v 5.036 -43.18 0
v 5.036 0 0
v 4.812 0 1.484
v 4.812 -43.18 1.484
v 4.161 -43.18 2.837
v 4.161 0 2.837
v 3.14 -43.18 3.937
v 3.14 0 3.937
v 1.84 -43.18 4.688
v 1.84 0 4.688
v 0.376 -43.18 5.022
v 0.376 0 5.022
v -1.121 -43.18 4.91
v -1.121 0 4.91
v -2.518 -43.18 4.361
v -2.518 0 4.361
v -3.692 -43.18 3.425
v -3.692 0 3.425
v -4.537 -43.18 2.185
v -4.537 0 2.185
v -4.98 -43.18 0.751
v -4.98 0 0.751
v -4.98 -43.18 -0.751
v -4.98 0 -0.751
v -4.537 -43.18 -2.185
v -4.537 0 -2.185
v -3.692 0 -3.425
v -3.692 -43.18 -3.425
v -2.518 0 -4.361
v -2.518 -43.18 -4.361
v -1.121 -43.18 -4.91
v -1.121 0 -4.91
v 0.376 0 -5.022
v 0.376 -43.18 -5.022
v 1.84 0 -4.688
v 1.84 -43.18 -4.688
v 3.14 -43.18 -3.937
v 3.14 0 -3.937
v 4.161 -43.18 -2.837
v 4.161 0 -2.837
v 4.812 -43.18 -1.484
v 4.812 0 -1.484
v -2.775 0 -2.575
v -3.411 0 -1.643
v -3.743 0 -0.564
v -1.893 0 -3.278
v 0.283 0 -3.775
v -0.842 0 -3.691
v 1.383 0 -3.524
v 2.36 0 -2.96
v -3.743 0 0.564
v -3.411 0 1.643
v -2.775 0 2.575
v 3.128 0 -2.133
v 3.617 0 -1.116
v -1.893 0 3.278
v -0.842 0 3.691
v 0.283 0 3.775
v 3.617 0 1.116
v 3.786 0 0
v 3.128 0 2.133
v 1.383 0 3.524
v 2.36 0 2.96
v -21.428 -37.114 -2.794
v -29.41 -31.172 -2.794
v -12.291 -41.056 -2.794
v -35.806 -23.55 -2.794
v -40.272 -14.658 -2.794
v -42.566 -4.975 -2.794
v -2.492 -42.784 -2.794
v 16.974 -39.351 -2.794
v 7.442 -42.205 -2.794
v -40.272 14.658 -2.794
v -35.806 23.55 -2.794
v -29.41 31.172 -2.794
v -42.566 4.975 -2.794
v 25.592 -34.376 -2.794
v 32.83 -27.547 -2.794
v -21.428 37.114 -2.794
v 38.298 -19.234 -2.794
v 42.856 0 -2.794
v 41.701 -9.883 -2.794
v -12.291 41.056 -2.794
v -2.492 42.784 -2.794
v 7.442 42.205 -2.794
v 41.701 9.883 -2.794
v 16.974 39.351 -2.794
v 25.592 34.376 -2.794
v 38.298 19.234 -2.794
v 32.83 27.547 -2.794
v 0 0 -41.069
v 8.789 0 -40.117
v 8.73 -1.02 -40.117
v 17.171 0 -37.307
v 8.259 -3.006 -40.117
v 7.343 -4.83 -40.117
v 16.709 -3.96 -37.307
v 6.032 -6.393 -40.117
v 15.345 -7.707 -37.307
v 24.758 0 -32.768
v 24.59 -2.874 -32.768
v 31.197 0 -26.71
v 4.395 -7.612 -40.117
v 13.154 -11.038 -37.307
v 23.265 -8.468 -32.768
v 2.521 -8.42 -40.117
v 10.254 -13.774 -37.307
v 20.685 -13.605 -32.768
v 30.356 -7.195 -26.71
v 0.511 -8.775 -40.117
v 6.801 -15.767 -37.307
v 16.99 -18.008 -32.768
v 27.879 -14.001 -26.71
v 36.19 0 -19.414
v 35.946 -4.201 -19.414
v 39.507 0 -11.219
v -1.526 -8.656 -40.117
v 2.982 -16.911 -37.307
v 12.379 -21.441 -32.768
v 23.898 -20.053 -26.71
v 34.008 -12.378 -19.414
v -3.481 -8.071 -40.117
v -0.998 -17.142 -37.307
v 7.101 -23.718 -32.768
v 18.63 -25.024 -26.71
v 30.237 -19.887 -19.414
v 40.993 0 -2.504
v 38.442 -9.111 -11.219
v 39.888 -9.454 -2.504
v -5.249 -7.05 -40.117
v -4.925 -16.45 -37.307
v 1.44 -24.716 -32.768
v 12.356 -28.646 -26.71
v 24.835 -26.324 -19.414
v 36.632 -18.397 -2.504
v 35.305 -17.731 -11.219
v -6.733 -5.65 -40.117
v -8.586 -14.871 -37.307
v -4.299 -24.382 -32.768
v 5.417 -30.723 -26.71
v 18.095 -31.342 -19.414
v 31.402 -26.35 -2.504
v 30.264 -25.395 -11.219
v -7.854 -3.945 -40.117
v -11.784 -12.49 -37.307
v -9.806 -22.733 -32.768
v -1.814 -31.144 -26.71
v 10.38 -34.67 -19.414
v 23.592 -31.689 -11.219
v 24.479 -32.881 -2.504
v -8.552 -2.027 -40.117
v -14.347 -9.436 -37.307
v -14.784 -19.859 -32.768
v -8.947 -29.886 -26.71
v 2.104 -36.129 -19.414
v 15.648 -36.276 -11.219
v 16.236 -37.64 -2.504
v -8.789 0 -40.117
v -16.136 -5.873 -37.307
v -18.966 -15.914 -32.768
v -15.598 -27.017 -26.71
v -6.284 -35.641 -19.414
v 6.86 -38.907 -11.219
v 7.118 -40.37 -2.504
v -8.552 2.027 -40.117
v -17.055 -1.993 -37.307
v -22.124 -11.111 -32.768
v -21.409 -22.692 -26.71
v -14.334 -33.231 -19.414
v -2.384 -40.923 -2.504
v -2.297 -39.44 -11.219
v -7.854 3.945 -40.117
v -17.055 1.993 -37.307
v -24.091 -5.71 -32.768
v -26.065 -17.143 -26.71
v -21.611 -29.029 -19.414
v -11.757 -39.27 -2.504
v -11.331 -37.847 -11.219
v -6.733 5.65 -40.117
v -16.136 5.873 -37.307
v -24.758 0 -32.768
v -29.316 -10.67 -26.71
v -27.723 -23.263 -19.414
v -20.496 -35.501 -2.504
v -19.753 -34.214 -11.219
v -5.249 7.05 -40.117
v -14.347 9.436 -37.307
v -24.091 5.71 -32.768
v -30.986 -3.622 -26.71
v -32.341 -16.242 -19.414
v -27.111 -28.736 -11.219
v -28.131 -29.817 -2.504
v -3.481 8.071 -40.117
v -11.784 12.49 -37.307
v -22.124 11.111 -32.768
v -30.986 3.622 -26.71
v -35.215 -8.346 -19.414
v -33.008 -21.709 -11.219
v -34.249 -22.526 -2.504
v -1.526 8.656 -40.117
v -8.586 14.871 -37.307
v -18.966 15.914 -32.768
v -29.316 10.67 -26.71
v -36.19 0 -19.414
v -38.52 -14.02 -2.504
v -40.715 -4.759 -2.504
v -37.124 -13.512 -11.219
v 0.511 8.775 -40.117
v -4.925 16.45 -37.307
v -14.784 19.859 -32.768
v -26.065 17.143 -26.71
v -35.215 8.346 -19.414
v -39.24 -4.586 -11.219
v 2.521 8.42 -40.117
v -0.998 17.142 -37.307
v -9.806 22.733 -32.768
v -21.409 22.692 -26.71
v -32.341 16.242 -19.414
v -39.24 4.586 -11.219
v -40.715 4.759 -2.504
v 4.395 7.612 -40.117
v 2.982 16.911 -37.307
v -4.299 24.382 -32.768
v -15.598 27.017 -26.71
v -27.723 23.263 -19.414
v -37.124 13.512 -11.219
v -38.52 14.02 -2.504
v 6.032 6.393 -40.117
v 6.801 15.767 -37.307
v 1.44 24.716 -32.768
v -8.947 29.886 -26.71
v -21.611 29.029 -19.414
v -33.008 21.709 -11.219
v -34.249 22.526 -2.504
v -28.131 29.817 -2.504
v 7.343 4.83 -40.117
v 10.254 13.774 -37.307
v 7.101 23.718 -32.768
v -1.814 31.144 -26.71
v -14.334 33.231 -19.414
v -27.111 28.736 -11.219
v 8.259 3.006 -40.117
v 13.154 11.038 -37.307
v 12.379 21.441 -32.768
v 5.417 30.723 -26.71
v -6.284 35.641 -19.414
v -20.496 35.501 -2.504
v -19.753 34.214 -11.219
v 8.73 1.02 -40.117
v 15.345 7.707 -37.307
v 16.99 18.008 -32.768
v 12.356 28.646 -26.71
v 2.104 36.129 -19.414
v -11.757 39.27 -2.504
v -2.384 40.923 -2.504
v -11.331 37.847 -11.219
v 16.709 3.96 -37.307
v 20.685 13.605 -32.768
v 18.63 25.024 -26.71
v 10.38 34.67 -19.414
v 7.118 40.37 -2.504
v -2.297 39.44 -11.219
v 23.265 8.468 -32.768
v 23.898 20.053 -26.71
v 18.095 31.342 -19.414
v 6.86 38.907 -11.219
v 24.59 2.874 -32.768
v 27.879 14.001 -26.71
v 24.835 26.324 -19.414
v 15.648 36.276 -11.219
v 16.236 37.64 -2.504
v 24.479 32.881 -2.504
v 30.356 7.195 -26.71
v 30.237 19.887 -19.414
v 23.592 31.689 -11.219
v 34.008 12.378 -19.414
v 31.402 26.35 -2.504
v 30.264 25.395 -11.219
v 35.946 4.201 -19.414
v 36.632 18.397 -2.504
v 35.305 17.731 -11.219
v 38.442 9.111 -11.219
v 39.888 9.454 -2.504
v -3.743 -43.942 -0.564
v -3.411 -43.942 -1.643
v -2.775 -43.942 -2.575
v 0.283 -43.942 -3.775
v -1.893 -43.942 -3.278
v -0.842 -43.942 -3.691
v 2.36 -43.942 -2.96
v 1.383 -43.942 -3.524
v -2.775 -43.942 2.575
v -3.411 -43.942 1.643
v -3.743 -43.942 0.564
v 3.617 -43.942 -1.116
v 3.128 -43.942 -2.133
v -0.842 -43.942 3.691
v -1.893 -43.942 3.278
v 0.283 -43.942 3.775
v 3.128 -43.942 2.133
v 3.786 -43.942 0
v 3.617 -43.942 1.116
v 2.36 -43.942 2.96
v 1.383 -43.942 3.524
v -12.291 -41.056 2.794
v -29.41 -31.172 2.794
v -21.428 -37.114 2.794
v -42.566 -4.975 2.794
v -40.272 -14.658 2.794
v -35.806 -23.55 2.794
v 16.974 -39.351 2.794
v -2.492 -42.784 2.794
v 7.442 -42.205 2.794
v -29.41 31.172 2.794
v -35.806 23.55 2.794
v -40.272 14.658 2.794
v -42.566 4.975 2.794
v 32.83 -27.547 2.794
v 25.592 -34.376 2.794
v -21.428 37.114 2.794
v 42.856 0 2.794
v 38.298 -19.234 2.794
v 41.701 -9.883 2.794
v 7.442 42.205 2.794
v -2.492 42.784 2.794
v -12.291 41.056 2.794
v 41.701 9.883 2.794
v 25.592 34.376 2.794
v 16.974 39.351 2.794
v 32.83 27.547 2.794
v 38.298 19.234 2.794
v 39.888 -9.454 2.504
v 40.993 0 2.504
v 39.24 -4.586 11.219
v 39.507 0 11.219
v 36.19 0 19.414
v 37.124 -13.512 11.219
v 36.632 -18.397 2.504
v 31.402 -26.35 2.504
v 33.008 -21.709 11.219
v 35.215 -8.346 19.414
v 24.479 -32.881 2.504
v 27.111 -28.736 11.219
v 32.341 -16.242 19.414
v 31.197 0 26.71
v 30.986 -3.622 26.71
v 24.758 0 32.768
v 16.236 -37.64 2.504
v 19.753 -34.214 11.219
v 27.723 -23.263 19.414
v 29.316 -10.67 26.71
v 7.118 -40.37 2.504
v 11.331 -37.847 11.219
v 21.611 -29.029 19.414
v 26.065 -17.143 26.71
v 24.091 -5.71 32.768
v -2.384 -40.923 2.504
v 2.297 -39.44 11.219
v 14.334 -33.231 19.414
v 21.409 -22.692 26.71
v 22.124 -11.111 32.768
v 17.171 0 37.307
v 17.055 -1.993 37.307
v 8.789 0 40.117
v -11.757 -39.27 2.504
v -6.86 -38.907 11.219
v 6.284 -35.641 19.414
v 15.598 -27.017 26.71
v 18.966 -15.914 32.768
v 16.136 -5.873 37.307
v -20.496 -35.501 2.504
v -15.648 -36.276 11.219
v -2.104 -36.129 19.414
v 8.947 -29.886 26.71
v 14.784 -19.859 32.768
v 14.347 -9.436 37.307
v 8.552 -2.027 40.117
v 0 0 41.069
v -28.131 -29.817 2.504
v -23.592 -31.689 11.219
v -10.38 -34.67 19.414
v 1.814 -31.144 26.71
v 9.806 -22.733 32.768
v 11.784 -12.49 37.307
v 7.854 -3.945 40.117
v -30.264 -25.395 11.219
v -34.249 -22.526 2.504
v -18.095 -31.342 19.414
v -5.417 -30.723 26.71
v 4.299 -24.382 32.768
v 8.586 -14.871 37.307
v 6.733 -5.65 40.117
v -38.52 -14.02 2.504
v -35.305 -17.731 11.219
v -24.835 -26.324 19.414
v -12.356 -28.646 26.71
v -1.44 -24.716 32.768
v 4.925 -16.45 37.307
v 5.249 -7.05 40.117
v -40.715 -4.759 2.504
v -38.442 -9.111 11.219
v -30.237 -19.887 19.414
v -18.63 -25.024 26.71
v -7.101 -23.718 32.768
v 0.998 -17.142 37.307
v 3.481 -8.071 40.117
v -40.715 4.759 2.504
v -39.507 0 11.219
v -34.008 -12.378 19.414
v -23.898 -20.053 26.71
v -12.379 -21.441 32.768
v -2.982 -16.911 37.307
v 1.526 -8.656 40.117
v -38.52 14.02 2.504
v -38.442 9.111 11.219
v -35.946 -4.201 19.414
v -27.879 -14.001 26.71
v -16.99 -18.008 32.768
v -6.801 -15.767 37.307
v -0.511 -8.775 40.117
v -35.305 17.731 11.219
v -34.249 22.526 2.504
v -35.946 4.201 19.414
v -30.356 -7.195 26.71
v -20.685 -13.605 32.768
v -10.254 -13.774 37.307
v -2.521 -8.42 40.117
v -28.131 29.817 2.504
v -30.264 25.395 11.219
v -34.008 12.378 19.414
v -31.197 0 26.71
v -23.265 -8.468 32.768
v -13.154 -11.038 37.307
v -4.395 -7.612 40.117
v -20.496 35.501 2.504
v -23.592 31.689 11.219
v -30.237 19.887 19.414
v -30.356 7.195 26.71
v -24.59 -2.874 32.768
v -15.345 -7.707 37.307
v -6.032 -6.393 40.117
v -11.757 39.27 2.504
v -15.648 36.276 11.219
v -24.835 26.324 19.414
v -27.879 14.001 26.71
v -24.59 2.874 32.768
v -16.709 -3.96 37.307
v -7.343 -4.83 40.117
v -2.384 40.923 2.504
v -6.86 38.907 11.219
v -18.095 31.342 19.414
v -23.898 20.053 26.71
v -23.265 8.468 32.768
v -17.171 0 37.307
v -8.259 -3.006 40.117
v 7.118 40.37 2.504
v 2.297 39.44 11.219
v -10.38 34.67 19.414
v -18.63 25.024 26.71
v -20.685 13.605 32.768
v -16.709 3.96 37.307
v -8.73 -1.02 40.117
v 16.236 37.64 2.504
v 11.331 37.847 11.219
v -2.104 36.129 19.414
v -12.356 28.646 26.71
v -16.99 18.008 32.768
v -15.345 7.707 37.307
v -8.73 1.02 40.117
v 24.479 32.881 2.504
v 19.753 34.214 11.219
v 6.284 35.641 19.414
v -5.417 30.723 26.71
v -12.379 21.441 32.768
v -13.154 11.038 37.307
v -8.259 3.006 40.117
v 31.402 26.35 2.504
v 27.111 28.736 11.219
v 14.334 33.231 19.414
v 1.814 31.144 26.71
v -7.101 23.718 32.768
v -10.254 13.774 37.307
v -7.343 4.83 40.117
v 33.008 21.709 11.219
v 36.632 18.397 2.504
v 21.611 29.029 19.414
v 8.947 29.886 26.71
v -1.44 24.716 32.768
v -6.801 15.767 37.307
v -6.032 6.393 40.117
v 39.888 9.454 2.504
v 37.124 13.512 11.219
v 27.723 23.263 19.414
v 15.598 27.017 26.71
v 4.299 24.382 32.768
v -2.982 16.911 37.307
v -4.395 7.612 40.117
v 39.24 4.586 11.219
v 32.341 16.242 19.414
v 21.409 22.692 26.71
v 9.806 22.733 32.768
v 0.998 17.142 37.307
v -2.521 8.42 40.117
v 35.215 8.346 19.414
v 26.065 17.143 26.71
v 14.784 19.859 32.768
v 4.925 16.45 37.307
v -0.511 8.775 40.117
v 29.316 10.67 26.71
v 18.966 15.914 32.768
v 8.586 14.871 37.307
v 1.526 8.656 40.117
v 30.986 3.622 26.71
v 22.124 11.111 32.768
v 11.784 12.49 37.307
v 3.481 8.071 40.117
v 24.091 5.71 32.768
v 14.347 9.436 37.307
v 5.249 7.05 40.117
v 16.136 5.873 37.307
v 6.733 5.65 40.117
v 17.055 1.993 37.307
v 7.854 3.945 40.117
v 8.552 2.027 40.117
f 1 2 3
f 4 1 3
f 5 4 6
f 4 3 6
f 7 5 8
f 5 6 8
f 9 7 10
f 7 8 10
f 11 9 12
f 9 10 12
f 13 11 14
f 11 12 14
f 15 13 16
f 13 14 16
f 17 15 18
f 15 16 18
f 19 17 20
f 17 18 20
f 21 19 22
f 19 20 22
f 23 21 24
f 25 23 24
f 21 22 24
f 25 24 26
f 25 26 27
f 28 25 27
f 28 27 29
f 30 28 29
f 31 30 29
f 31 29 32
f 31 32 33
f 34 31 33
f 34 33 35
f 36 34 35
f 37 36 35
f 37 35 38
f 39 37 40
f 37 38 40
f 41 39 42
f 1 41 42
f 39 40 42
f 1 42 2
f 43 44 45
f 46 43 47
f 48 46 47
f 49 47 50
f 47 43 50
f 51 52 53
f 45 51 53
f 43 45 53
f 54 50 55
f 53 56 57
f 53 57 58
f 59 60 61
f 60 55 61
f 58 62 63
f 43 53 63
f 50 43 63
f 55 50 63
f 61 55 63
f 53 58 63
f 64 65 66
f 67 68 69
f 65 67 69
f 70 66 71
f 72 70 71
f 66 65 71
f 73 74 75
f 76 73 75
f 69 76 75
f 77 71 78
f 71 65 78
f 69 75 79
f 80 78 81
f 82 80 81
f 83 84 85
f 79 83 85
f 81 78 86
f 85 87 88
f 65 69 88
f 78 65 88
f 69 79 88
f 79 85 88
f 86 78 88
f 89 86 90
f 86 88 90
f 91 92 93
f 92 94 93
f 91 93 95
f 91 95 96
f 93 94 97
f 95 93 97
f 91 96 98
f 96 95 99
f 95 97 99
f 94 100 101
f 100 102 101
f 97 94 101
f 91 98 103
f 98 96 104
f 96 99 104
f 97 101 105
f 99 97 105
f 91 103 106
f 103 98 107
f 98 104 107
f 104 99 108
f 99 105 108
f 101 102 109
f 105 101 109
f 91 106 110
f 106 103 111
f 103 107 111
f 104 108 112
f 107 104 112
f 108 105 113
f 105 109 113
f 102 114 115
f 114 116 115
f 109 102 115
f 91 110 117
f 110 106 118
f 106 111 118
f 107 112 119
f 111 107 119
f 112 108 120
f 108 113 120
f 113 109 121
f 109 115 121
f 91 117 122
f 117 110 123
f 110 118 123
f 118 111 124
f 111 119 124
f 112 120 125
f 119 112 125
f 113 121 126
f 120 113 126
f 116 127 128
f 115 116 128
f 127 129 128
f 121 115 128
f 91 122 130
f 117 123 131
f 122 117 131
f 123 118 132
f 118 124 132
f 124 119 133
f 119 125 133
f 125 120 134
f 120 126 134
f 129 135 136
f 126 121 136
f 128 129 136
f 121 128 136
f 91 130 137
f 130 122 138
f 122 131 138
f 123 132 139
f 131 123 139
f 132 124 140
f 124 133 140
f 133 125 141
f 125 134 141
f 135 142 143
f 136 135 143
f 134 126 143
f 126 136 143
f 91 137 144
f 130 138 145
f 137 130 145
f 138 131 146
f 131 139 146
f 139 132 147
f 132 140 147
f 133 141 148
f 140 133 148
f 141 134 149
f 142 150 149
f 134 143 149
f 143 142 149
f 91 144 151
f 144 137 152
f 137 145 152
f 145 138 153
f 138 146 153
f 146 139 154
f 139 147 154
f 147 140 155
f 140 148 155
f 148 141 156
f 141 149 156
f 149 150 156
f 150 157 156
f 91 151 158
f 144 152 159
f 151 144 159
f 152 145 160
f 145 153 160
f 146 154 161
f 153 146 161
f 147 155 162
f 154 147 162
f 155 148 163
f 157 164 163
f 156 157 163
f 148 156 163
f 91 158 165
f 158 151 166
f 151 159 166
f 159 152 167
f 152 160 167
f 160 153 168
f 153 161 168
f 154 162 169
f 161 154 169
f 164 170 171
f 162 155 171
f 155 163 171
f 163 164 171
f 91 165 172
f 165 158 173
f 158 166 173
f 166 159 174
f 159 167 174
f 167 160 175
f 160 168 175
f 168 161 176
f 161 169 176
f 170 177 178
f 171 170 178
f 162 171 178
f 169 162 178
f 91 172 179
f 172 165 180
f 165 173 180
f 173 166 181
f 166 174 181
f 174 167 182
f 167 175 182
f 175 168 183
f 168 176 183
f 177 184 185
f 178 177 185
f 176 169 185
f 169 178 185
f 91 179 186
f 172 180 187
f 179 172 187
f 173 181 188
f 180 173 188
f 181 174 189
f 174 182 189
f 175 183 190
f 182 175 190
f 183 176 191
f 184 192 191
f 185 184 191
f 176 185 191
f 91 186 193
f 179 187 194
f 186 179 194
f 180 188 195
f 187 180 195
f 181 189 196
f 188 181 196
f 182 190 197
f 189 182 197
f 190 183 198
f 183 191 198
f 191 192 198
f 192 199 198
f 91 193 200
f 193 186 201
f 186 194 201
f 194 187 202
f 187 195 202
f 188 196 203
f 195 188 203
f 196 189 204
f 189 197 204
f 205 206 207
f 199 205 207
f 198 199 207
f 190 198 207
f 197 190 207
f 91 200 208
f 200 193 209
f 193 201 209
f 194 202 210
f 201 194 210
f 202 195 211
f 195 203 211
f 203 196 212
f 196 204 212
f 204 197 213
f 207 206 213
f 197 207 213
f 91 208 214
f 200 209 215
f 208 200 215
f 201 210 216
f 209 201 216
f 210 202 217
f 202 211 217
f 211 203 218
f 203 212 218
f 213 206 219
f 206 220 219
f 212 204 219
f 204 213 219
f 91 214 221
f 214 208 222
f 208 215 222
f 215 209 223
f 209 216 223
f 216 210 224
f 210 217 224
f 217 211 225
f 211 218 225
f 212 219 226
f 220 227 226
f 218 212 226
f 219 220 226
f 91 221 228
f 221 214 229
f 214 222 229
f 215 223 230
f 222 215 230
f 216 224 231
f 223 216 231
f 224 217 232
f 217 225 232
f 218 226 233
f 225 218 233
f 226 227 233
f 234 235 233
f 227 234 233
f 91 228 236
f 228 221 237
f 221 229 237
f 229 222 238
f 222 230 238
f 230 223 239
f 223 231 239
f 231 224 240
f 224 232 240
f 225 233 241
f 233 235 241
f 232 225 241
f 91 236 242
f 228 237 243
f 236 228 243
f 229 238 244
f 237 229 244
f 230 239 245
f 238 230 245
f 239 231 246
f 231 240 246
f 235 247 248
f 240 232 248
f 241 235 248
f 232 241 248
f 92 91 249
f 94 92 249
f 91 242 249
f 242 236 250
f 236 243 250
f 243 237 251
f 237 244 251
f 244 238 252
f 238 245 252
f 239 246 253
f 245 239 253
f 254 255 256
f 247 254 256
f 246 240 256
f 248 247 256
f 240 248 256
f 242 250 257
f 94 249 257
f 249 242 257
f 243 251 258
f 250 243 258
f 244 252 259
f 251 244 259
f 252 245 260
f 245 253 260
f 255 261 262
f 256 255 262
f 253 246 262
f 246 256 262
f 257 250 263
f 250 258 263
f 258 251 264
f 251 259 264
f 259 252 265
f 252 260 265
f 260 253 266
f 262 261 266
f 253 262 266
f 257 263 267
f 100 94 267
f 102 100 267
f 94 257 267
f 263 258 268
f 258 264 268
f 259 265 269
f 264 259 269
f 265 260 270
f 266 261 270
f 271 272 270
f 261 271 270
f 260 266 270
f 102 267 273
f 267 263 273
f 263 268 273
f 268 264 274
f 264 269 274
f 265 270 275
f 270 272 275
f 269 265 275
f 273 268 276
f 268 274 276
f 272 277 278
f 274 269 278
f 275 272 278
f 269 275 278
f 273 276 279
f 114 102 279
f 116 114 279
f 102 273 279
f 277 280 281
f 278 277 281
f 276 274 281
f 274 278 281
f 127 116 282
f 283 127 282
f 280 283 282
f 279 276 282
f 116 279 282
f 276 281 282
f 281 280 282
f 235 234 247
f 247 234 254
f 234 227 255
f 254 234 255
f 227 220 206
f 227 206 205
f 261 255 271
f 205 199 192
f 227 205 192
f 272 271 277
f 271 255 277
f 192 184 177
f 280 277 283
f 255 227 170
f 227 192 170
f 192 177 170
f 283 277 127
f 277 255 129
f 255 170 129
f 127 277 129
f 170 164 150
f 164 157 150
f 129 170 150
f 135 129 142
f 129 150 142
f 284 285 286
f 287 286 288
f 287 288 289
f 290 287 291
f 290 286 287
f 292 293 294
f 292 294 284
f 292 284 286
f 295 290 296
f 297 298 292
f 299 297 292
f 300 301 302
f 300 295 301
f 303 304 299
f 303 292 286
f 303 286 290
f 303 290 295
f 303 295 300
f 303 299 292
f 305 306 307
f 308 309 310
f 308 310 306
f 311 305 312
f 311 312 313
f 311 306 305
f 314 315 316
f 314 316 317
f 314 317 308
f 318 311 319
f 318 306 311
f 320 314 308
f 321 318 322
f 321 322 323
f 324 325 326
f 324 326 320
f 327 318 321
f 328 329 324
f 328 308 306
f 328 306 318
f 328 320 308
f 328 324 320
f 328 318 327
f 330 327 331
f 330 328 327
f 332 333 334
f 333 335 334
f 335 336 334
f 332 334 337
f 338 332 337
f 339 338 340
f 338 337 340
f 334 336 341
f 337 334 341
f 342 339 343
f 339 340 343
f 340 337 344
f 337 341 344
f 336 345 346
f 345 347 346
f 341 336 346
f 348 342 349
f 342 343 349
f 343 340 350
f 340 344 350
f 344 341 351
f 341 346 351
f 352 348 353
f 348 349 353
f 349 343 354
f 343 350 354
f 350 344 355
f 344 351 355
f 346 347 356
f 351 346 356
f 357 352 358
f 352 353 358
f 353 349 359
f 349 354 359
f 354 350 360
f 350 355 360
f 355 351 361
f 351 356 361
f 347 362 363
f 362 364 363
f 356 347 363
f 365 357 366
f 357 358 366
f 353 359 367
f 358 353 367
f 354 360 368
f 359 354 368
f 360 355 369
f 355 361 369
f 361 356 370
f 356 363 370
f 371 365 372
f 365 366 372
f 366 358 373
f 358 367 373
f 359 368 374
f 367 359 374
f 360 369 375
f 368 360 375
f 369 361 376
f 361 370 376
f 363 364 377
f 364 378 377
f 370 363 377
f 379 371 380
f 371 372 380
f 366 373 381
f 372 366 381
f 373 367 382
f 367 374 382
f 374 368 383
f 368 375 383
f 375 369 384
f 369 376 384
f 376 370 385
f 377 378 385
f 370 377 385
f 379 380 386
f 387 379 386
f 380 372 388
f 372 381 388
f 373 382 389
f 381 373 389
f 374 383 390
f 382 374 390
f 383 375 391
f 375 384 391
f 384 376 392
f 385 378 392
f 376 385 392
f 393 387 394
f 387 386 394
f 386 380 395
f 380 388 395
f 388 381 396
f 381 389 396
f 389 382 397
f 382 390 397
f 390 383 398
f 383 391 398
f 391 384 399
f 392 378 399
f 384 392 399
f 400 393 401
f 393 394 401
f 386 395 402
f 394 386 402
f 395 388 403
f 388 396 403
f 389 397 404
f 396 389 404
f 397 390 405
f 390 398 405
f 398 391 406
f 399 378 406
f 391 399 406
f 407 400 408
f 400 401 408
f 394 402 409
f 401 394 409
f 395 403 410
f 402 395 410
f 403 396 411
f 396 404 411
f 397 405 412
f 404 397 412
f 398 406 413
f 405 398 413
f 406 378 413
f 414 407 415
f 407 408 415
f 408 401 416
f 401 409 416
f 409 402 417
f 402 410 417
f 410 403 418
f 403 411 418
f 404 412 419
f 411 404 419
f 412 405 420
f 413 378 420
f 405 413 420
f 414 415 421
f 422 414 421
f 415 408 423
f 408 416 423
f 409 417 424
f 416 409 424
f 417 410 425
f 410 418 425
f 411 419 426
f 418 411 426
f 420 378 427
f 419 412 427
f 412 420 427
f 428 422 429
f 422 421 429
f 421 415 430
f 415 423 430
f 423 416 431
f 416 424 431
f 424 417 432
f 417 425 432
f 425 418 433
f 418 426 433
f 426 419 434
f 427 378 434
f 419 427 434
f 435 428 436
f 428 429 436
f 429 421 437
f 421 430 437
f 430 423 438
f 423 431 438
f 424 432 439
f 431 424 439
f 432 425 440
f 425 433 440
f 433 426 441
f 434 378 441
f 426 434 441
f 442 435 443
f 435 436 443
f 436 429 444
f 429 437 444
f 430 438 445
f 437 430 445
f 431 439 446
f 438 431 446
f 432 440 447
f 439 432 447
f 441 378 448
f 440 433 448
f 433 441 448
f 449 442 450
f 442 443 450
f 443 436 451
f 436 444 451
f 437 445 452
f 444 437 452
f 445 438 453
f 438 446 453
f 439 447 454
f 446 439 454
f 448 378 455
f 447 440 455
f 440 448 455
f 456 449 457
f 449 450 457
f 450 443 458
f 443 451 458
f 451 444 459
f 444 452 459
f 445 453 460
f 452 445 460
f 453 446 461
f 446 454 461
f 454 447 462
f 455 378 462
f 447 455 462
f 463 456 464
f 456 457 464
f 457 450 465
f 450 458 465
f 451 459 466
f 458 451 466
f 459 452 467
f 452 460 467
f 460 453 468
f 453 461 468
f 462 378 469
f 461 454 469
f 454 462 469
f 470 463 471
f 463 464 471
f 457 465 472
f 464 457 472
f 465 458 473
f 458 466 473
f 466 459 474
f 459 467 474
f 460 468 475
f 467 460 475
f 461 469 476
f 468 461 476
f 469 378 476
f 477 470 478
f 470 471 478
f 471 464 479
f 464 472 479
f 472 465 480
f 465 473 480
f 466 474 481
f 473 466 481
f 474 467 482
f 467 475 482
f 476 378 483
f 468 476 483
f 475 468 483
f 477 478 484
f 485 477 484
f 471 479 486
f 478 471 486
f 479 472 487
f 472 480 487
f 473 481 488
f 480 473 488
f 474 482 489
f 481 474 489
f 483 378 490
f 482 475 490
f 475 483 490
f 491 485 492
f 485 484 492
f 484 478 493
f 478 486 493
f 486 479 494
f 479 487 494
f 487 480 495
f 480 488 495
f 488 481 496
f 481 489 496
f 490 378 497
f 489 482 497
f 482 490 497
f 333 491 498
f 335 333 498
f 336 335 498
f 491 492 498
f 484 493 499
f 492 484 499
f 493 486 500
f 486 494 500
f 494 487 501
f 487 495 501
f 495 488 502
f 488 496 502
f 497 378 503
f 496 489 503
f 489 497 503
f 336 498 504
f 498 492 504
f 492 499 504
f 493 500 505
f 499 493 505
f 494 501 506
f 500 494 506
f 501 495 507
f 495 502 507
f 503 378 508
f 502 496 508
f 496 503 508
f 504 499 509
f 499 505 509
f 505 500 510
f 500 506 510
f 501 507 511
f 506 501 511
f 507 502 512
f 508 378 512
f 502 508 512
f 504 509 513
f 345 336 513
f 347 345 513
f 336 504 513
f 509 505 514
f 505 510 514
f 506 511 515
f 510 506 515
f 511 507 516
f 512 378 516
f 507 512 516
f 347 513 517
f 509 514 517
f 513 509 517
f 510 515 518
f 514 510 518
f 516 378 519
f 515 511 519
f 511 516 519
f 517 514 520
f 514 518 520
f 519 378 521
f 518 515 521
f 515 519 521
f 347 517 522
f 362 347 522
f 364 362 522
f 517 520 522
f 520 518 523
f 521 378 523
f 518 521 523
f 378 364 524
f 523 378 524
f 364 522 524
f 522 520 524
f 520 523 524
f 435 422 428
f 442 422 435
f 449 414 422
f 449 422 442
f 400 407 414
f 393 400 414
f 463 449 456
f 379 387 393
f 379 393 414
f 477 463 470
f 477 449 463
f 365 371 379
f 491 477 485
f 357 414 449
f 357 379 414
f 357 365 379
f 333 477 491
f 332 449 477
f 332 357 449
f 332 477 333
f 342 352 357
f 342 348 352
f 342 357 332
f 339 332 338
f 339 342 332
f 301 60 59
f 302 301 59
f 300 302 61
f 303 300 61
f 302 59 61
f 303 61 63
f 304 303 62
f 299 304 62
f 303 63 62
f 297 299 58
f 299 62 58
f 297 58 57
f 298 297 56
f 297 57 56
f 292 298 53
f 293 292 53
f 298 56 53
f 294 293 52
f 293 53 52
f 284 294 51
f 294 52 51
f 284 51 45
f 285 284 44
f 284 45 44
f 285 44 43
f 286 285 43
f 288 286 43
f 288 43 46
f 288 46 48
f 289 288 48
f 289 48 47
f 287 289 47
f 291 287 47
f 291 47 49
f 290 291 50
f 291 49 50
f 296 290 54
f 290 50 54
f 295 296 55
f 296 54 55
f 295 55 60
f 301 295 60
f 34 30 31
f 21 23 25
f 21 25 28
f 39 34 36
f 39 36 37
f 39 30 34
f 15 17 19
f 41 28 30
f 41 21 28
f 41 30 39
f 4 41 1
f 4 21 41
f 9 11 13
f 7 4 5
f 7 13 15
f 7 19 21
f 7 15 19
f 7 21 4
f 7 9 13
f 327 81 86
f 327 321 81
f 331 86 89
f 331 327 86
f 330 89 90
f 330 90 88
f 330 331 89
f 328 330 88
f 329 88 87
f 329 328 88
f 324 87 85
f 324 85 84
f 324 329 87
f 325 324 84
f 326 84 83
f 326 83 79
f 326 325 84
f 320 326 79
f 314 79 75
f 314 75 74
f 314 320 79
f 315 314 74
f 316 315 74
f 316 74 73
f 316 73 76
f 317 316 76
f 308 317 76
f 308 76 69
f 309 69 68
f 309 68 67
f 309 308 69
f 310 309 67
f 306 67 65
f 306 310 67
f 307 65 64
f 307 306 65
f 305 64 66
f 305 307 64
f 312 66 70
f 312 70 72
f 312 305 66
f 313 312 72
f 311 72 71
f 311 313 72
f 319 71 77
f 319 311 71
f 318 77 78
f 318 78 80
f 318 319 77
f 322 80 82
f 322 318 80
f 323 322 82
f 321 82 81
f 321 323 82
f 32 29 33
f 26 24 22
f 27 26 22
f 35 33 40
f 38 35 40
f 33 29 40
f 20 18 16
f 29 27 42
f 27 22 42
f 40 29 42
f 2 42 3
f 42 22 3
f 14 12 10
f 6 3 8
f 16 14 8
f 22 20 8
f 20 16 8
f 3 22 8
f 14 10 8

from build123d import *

# Parameters (mm, degrees)
F3_W      = 90.966984
F3_H      = 5.0084
F4_DEPTH  = 191.008
F5_R      = 42.856131
F6_DEPTH  = 2.794
F7_R      = 3.785629
F8_DEPTH  = 43.942
F9_R      = 5.036041
F10_DEPTH = 43.18


with BuildPart() as f1:
    # F0 (on Front) → F1 (revolve)
    with BuildSketch(Plane.XZ):
        with BuildLine():
            Line((0, 41.069034), (0, -41.069034))
            ThreePointArc((0, -41.069034), (41.069034, 0), (0, 41.069034))
        make_face()
    revolve(axis=Axis((0, 0, 0), (0, 0, -1)))

    # F3 (on offset) → F4 (cut)
    with BuildSketch(Plane.XZ.offset(74.676)):
        Rectangle(F3_W, F3_H)
    extrude(amount=-F4_DEPTH, mode=Mode.SUBTRACT)


with BuildPart() as f6:
    # F5 (on Top) → F6 (new body, symmetric)
    with BuildSketch(Plane.XY):
        Circle(F5_R)
    extrude(amount=F6_DEPTH, both=True)


with BuildPart() as f8:
    # F7 (on Front) → F8 (new body)
    with BuildSketch(Plane.XZ):
        Circle(F7_R)
    extrude(amount=F8_DEPTH)


with BuildPart() as f10:
    # F9 (on Front) → F10 (new body)
    with BuildSketch(Plane.XZ):
        Circle(F9_R)
    extrude(amount=F10_DEPTH)


solid = Compound([f1.part, f6.part, f8.part, f10.part])
